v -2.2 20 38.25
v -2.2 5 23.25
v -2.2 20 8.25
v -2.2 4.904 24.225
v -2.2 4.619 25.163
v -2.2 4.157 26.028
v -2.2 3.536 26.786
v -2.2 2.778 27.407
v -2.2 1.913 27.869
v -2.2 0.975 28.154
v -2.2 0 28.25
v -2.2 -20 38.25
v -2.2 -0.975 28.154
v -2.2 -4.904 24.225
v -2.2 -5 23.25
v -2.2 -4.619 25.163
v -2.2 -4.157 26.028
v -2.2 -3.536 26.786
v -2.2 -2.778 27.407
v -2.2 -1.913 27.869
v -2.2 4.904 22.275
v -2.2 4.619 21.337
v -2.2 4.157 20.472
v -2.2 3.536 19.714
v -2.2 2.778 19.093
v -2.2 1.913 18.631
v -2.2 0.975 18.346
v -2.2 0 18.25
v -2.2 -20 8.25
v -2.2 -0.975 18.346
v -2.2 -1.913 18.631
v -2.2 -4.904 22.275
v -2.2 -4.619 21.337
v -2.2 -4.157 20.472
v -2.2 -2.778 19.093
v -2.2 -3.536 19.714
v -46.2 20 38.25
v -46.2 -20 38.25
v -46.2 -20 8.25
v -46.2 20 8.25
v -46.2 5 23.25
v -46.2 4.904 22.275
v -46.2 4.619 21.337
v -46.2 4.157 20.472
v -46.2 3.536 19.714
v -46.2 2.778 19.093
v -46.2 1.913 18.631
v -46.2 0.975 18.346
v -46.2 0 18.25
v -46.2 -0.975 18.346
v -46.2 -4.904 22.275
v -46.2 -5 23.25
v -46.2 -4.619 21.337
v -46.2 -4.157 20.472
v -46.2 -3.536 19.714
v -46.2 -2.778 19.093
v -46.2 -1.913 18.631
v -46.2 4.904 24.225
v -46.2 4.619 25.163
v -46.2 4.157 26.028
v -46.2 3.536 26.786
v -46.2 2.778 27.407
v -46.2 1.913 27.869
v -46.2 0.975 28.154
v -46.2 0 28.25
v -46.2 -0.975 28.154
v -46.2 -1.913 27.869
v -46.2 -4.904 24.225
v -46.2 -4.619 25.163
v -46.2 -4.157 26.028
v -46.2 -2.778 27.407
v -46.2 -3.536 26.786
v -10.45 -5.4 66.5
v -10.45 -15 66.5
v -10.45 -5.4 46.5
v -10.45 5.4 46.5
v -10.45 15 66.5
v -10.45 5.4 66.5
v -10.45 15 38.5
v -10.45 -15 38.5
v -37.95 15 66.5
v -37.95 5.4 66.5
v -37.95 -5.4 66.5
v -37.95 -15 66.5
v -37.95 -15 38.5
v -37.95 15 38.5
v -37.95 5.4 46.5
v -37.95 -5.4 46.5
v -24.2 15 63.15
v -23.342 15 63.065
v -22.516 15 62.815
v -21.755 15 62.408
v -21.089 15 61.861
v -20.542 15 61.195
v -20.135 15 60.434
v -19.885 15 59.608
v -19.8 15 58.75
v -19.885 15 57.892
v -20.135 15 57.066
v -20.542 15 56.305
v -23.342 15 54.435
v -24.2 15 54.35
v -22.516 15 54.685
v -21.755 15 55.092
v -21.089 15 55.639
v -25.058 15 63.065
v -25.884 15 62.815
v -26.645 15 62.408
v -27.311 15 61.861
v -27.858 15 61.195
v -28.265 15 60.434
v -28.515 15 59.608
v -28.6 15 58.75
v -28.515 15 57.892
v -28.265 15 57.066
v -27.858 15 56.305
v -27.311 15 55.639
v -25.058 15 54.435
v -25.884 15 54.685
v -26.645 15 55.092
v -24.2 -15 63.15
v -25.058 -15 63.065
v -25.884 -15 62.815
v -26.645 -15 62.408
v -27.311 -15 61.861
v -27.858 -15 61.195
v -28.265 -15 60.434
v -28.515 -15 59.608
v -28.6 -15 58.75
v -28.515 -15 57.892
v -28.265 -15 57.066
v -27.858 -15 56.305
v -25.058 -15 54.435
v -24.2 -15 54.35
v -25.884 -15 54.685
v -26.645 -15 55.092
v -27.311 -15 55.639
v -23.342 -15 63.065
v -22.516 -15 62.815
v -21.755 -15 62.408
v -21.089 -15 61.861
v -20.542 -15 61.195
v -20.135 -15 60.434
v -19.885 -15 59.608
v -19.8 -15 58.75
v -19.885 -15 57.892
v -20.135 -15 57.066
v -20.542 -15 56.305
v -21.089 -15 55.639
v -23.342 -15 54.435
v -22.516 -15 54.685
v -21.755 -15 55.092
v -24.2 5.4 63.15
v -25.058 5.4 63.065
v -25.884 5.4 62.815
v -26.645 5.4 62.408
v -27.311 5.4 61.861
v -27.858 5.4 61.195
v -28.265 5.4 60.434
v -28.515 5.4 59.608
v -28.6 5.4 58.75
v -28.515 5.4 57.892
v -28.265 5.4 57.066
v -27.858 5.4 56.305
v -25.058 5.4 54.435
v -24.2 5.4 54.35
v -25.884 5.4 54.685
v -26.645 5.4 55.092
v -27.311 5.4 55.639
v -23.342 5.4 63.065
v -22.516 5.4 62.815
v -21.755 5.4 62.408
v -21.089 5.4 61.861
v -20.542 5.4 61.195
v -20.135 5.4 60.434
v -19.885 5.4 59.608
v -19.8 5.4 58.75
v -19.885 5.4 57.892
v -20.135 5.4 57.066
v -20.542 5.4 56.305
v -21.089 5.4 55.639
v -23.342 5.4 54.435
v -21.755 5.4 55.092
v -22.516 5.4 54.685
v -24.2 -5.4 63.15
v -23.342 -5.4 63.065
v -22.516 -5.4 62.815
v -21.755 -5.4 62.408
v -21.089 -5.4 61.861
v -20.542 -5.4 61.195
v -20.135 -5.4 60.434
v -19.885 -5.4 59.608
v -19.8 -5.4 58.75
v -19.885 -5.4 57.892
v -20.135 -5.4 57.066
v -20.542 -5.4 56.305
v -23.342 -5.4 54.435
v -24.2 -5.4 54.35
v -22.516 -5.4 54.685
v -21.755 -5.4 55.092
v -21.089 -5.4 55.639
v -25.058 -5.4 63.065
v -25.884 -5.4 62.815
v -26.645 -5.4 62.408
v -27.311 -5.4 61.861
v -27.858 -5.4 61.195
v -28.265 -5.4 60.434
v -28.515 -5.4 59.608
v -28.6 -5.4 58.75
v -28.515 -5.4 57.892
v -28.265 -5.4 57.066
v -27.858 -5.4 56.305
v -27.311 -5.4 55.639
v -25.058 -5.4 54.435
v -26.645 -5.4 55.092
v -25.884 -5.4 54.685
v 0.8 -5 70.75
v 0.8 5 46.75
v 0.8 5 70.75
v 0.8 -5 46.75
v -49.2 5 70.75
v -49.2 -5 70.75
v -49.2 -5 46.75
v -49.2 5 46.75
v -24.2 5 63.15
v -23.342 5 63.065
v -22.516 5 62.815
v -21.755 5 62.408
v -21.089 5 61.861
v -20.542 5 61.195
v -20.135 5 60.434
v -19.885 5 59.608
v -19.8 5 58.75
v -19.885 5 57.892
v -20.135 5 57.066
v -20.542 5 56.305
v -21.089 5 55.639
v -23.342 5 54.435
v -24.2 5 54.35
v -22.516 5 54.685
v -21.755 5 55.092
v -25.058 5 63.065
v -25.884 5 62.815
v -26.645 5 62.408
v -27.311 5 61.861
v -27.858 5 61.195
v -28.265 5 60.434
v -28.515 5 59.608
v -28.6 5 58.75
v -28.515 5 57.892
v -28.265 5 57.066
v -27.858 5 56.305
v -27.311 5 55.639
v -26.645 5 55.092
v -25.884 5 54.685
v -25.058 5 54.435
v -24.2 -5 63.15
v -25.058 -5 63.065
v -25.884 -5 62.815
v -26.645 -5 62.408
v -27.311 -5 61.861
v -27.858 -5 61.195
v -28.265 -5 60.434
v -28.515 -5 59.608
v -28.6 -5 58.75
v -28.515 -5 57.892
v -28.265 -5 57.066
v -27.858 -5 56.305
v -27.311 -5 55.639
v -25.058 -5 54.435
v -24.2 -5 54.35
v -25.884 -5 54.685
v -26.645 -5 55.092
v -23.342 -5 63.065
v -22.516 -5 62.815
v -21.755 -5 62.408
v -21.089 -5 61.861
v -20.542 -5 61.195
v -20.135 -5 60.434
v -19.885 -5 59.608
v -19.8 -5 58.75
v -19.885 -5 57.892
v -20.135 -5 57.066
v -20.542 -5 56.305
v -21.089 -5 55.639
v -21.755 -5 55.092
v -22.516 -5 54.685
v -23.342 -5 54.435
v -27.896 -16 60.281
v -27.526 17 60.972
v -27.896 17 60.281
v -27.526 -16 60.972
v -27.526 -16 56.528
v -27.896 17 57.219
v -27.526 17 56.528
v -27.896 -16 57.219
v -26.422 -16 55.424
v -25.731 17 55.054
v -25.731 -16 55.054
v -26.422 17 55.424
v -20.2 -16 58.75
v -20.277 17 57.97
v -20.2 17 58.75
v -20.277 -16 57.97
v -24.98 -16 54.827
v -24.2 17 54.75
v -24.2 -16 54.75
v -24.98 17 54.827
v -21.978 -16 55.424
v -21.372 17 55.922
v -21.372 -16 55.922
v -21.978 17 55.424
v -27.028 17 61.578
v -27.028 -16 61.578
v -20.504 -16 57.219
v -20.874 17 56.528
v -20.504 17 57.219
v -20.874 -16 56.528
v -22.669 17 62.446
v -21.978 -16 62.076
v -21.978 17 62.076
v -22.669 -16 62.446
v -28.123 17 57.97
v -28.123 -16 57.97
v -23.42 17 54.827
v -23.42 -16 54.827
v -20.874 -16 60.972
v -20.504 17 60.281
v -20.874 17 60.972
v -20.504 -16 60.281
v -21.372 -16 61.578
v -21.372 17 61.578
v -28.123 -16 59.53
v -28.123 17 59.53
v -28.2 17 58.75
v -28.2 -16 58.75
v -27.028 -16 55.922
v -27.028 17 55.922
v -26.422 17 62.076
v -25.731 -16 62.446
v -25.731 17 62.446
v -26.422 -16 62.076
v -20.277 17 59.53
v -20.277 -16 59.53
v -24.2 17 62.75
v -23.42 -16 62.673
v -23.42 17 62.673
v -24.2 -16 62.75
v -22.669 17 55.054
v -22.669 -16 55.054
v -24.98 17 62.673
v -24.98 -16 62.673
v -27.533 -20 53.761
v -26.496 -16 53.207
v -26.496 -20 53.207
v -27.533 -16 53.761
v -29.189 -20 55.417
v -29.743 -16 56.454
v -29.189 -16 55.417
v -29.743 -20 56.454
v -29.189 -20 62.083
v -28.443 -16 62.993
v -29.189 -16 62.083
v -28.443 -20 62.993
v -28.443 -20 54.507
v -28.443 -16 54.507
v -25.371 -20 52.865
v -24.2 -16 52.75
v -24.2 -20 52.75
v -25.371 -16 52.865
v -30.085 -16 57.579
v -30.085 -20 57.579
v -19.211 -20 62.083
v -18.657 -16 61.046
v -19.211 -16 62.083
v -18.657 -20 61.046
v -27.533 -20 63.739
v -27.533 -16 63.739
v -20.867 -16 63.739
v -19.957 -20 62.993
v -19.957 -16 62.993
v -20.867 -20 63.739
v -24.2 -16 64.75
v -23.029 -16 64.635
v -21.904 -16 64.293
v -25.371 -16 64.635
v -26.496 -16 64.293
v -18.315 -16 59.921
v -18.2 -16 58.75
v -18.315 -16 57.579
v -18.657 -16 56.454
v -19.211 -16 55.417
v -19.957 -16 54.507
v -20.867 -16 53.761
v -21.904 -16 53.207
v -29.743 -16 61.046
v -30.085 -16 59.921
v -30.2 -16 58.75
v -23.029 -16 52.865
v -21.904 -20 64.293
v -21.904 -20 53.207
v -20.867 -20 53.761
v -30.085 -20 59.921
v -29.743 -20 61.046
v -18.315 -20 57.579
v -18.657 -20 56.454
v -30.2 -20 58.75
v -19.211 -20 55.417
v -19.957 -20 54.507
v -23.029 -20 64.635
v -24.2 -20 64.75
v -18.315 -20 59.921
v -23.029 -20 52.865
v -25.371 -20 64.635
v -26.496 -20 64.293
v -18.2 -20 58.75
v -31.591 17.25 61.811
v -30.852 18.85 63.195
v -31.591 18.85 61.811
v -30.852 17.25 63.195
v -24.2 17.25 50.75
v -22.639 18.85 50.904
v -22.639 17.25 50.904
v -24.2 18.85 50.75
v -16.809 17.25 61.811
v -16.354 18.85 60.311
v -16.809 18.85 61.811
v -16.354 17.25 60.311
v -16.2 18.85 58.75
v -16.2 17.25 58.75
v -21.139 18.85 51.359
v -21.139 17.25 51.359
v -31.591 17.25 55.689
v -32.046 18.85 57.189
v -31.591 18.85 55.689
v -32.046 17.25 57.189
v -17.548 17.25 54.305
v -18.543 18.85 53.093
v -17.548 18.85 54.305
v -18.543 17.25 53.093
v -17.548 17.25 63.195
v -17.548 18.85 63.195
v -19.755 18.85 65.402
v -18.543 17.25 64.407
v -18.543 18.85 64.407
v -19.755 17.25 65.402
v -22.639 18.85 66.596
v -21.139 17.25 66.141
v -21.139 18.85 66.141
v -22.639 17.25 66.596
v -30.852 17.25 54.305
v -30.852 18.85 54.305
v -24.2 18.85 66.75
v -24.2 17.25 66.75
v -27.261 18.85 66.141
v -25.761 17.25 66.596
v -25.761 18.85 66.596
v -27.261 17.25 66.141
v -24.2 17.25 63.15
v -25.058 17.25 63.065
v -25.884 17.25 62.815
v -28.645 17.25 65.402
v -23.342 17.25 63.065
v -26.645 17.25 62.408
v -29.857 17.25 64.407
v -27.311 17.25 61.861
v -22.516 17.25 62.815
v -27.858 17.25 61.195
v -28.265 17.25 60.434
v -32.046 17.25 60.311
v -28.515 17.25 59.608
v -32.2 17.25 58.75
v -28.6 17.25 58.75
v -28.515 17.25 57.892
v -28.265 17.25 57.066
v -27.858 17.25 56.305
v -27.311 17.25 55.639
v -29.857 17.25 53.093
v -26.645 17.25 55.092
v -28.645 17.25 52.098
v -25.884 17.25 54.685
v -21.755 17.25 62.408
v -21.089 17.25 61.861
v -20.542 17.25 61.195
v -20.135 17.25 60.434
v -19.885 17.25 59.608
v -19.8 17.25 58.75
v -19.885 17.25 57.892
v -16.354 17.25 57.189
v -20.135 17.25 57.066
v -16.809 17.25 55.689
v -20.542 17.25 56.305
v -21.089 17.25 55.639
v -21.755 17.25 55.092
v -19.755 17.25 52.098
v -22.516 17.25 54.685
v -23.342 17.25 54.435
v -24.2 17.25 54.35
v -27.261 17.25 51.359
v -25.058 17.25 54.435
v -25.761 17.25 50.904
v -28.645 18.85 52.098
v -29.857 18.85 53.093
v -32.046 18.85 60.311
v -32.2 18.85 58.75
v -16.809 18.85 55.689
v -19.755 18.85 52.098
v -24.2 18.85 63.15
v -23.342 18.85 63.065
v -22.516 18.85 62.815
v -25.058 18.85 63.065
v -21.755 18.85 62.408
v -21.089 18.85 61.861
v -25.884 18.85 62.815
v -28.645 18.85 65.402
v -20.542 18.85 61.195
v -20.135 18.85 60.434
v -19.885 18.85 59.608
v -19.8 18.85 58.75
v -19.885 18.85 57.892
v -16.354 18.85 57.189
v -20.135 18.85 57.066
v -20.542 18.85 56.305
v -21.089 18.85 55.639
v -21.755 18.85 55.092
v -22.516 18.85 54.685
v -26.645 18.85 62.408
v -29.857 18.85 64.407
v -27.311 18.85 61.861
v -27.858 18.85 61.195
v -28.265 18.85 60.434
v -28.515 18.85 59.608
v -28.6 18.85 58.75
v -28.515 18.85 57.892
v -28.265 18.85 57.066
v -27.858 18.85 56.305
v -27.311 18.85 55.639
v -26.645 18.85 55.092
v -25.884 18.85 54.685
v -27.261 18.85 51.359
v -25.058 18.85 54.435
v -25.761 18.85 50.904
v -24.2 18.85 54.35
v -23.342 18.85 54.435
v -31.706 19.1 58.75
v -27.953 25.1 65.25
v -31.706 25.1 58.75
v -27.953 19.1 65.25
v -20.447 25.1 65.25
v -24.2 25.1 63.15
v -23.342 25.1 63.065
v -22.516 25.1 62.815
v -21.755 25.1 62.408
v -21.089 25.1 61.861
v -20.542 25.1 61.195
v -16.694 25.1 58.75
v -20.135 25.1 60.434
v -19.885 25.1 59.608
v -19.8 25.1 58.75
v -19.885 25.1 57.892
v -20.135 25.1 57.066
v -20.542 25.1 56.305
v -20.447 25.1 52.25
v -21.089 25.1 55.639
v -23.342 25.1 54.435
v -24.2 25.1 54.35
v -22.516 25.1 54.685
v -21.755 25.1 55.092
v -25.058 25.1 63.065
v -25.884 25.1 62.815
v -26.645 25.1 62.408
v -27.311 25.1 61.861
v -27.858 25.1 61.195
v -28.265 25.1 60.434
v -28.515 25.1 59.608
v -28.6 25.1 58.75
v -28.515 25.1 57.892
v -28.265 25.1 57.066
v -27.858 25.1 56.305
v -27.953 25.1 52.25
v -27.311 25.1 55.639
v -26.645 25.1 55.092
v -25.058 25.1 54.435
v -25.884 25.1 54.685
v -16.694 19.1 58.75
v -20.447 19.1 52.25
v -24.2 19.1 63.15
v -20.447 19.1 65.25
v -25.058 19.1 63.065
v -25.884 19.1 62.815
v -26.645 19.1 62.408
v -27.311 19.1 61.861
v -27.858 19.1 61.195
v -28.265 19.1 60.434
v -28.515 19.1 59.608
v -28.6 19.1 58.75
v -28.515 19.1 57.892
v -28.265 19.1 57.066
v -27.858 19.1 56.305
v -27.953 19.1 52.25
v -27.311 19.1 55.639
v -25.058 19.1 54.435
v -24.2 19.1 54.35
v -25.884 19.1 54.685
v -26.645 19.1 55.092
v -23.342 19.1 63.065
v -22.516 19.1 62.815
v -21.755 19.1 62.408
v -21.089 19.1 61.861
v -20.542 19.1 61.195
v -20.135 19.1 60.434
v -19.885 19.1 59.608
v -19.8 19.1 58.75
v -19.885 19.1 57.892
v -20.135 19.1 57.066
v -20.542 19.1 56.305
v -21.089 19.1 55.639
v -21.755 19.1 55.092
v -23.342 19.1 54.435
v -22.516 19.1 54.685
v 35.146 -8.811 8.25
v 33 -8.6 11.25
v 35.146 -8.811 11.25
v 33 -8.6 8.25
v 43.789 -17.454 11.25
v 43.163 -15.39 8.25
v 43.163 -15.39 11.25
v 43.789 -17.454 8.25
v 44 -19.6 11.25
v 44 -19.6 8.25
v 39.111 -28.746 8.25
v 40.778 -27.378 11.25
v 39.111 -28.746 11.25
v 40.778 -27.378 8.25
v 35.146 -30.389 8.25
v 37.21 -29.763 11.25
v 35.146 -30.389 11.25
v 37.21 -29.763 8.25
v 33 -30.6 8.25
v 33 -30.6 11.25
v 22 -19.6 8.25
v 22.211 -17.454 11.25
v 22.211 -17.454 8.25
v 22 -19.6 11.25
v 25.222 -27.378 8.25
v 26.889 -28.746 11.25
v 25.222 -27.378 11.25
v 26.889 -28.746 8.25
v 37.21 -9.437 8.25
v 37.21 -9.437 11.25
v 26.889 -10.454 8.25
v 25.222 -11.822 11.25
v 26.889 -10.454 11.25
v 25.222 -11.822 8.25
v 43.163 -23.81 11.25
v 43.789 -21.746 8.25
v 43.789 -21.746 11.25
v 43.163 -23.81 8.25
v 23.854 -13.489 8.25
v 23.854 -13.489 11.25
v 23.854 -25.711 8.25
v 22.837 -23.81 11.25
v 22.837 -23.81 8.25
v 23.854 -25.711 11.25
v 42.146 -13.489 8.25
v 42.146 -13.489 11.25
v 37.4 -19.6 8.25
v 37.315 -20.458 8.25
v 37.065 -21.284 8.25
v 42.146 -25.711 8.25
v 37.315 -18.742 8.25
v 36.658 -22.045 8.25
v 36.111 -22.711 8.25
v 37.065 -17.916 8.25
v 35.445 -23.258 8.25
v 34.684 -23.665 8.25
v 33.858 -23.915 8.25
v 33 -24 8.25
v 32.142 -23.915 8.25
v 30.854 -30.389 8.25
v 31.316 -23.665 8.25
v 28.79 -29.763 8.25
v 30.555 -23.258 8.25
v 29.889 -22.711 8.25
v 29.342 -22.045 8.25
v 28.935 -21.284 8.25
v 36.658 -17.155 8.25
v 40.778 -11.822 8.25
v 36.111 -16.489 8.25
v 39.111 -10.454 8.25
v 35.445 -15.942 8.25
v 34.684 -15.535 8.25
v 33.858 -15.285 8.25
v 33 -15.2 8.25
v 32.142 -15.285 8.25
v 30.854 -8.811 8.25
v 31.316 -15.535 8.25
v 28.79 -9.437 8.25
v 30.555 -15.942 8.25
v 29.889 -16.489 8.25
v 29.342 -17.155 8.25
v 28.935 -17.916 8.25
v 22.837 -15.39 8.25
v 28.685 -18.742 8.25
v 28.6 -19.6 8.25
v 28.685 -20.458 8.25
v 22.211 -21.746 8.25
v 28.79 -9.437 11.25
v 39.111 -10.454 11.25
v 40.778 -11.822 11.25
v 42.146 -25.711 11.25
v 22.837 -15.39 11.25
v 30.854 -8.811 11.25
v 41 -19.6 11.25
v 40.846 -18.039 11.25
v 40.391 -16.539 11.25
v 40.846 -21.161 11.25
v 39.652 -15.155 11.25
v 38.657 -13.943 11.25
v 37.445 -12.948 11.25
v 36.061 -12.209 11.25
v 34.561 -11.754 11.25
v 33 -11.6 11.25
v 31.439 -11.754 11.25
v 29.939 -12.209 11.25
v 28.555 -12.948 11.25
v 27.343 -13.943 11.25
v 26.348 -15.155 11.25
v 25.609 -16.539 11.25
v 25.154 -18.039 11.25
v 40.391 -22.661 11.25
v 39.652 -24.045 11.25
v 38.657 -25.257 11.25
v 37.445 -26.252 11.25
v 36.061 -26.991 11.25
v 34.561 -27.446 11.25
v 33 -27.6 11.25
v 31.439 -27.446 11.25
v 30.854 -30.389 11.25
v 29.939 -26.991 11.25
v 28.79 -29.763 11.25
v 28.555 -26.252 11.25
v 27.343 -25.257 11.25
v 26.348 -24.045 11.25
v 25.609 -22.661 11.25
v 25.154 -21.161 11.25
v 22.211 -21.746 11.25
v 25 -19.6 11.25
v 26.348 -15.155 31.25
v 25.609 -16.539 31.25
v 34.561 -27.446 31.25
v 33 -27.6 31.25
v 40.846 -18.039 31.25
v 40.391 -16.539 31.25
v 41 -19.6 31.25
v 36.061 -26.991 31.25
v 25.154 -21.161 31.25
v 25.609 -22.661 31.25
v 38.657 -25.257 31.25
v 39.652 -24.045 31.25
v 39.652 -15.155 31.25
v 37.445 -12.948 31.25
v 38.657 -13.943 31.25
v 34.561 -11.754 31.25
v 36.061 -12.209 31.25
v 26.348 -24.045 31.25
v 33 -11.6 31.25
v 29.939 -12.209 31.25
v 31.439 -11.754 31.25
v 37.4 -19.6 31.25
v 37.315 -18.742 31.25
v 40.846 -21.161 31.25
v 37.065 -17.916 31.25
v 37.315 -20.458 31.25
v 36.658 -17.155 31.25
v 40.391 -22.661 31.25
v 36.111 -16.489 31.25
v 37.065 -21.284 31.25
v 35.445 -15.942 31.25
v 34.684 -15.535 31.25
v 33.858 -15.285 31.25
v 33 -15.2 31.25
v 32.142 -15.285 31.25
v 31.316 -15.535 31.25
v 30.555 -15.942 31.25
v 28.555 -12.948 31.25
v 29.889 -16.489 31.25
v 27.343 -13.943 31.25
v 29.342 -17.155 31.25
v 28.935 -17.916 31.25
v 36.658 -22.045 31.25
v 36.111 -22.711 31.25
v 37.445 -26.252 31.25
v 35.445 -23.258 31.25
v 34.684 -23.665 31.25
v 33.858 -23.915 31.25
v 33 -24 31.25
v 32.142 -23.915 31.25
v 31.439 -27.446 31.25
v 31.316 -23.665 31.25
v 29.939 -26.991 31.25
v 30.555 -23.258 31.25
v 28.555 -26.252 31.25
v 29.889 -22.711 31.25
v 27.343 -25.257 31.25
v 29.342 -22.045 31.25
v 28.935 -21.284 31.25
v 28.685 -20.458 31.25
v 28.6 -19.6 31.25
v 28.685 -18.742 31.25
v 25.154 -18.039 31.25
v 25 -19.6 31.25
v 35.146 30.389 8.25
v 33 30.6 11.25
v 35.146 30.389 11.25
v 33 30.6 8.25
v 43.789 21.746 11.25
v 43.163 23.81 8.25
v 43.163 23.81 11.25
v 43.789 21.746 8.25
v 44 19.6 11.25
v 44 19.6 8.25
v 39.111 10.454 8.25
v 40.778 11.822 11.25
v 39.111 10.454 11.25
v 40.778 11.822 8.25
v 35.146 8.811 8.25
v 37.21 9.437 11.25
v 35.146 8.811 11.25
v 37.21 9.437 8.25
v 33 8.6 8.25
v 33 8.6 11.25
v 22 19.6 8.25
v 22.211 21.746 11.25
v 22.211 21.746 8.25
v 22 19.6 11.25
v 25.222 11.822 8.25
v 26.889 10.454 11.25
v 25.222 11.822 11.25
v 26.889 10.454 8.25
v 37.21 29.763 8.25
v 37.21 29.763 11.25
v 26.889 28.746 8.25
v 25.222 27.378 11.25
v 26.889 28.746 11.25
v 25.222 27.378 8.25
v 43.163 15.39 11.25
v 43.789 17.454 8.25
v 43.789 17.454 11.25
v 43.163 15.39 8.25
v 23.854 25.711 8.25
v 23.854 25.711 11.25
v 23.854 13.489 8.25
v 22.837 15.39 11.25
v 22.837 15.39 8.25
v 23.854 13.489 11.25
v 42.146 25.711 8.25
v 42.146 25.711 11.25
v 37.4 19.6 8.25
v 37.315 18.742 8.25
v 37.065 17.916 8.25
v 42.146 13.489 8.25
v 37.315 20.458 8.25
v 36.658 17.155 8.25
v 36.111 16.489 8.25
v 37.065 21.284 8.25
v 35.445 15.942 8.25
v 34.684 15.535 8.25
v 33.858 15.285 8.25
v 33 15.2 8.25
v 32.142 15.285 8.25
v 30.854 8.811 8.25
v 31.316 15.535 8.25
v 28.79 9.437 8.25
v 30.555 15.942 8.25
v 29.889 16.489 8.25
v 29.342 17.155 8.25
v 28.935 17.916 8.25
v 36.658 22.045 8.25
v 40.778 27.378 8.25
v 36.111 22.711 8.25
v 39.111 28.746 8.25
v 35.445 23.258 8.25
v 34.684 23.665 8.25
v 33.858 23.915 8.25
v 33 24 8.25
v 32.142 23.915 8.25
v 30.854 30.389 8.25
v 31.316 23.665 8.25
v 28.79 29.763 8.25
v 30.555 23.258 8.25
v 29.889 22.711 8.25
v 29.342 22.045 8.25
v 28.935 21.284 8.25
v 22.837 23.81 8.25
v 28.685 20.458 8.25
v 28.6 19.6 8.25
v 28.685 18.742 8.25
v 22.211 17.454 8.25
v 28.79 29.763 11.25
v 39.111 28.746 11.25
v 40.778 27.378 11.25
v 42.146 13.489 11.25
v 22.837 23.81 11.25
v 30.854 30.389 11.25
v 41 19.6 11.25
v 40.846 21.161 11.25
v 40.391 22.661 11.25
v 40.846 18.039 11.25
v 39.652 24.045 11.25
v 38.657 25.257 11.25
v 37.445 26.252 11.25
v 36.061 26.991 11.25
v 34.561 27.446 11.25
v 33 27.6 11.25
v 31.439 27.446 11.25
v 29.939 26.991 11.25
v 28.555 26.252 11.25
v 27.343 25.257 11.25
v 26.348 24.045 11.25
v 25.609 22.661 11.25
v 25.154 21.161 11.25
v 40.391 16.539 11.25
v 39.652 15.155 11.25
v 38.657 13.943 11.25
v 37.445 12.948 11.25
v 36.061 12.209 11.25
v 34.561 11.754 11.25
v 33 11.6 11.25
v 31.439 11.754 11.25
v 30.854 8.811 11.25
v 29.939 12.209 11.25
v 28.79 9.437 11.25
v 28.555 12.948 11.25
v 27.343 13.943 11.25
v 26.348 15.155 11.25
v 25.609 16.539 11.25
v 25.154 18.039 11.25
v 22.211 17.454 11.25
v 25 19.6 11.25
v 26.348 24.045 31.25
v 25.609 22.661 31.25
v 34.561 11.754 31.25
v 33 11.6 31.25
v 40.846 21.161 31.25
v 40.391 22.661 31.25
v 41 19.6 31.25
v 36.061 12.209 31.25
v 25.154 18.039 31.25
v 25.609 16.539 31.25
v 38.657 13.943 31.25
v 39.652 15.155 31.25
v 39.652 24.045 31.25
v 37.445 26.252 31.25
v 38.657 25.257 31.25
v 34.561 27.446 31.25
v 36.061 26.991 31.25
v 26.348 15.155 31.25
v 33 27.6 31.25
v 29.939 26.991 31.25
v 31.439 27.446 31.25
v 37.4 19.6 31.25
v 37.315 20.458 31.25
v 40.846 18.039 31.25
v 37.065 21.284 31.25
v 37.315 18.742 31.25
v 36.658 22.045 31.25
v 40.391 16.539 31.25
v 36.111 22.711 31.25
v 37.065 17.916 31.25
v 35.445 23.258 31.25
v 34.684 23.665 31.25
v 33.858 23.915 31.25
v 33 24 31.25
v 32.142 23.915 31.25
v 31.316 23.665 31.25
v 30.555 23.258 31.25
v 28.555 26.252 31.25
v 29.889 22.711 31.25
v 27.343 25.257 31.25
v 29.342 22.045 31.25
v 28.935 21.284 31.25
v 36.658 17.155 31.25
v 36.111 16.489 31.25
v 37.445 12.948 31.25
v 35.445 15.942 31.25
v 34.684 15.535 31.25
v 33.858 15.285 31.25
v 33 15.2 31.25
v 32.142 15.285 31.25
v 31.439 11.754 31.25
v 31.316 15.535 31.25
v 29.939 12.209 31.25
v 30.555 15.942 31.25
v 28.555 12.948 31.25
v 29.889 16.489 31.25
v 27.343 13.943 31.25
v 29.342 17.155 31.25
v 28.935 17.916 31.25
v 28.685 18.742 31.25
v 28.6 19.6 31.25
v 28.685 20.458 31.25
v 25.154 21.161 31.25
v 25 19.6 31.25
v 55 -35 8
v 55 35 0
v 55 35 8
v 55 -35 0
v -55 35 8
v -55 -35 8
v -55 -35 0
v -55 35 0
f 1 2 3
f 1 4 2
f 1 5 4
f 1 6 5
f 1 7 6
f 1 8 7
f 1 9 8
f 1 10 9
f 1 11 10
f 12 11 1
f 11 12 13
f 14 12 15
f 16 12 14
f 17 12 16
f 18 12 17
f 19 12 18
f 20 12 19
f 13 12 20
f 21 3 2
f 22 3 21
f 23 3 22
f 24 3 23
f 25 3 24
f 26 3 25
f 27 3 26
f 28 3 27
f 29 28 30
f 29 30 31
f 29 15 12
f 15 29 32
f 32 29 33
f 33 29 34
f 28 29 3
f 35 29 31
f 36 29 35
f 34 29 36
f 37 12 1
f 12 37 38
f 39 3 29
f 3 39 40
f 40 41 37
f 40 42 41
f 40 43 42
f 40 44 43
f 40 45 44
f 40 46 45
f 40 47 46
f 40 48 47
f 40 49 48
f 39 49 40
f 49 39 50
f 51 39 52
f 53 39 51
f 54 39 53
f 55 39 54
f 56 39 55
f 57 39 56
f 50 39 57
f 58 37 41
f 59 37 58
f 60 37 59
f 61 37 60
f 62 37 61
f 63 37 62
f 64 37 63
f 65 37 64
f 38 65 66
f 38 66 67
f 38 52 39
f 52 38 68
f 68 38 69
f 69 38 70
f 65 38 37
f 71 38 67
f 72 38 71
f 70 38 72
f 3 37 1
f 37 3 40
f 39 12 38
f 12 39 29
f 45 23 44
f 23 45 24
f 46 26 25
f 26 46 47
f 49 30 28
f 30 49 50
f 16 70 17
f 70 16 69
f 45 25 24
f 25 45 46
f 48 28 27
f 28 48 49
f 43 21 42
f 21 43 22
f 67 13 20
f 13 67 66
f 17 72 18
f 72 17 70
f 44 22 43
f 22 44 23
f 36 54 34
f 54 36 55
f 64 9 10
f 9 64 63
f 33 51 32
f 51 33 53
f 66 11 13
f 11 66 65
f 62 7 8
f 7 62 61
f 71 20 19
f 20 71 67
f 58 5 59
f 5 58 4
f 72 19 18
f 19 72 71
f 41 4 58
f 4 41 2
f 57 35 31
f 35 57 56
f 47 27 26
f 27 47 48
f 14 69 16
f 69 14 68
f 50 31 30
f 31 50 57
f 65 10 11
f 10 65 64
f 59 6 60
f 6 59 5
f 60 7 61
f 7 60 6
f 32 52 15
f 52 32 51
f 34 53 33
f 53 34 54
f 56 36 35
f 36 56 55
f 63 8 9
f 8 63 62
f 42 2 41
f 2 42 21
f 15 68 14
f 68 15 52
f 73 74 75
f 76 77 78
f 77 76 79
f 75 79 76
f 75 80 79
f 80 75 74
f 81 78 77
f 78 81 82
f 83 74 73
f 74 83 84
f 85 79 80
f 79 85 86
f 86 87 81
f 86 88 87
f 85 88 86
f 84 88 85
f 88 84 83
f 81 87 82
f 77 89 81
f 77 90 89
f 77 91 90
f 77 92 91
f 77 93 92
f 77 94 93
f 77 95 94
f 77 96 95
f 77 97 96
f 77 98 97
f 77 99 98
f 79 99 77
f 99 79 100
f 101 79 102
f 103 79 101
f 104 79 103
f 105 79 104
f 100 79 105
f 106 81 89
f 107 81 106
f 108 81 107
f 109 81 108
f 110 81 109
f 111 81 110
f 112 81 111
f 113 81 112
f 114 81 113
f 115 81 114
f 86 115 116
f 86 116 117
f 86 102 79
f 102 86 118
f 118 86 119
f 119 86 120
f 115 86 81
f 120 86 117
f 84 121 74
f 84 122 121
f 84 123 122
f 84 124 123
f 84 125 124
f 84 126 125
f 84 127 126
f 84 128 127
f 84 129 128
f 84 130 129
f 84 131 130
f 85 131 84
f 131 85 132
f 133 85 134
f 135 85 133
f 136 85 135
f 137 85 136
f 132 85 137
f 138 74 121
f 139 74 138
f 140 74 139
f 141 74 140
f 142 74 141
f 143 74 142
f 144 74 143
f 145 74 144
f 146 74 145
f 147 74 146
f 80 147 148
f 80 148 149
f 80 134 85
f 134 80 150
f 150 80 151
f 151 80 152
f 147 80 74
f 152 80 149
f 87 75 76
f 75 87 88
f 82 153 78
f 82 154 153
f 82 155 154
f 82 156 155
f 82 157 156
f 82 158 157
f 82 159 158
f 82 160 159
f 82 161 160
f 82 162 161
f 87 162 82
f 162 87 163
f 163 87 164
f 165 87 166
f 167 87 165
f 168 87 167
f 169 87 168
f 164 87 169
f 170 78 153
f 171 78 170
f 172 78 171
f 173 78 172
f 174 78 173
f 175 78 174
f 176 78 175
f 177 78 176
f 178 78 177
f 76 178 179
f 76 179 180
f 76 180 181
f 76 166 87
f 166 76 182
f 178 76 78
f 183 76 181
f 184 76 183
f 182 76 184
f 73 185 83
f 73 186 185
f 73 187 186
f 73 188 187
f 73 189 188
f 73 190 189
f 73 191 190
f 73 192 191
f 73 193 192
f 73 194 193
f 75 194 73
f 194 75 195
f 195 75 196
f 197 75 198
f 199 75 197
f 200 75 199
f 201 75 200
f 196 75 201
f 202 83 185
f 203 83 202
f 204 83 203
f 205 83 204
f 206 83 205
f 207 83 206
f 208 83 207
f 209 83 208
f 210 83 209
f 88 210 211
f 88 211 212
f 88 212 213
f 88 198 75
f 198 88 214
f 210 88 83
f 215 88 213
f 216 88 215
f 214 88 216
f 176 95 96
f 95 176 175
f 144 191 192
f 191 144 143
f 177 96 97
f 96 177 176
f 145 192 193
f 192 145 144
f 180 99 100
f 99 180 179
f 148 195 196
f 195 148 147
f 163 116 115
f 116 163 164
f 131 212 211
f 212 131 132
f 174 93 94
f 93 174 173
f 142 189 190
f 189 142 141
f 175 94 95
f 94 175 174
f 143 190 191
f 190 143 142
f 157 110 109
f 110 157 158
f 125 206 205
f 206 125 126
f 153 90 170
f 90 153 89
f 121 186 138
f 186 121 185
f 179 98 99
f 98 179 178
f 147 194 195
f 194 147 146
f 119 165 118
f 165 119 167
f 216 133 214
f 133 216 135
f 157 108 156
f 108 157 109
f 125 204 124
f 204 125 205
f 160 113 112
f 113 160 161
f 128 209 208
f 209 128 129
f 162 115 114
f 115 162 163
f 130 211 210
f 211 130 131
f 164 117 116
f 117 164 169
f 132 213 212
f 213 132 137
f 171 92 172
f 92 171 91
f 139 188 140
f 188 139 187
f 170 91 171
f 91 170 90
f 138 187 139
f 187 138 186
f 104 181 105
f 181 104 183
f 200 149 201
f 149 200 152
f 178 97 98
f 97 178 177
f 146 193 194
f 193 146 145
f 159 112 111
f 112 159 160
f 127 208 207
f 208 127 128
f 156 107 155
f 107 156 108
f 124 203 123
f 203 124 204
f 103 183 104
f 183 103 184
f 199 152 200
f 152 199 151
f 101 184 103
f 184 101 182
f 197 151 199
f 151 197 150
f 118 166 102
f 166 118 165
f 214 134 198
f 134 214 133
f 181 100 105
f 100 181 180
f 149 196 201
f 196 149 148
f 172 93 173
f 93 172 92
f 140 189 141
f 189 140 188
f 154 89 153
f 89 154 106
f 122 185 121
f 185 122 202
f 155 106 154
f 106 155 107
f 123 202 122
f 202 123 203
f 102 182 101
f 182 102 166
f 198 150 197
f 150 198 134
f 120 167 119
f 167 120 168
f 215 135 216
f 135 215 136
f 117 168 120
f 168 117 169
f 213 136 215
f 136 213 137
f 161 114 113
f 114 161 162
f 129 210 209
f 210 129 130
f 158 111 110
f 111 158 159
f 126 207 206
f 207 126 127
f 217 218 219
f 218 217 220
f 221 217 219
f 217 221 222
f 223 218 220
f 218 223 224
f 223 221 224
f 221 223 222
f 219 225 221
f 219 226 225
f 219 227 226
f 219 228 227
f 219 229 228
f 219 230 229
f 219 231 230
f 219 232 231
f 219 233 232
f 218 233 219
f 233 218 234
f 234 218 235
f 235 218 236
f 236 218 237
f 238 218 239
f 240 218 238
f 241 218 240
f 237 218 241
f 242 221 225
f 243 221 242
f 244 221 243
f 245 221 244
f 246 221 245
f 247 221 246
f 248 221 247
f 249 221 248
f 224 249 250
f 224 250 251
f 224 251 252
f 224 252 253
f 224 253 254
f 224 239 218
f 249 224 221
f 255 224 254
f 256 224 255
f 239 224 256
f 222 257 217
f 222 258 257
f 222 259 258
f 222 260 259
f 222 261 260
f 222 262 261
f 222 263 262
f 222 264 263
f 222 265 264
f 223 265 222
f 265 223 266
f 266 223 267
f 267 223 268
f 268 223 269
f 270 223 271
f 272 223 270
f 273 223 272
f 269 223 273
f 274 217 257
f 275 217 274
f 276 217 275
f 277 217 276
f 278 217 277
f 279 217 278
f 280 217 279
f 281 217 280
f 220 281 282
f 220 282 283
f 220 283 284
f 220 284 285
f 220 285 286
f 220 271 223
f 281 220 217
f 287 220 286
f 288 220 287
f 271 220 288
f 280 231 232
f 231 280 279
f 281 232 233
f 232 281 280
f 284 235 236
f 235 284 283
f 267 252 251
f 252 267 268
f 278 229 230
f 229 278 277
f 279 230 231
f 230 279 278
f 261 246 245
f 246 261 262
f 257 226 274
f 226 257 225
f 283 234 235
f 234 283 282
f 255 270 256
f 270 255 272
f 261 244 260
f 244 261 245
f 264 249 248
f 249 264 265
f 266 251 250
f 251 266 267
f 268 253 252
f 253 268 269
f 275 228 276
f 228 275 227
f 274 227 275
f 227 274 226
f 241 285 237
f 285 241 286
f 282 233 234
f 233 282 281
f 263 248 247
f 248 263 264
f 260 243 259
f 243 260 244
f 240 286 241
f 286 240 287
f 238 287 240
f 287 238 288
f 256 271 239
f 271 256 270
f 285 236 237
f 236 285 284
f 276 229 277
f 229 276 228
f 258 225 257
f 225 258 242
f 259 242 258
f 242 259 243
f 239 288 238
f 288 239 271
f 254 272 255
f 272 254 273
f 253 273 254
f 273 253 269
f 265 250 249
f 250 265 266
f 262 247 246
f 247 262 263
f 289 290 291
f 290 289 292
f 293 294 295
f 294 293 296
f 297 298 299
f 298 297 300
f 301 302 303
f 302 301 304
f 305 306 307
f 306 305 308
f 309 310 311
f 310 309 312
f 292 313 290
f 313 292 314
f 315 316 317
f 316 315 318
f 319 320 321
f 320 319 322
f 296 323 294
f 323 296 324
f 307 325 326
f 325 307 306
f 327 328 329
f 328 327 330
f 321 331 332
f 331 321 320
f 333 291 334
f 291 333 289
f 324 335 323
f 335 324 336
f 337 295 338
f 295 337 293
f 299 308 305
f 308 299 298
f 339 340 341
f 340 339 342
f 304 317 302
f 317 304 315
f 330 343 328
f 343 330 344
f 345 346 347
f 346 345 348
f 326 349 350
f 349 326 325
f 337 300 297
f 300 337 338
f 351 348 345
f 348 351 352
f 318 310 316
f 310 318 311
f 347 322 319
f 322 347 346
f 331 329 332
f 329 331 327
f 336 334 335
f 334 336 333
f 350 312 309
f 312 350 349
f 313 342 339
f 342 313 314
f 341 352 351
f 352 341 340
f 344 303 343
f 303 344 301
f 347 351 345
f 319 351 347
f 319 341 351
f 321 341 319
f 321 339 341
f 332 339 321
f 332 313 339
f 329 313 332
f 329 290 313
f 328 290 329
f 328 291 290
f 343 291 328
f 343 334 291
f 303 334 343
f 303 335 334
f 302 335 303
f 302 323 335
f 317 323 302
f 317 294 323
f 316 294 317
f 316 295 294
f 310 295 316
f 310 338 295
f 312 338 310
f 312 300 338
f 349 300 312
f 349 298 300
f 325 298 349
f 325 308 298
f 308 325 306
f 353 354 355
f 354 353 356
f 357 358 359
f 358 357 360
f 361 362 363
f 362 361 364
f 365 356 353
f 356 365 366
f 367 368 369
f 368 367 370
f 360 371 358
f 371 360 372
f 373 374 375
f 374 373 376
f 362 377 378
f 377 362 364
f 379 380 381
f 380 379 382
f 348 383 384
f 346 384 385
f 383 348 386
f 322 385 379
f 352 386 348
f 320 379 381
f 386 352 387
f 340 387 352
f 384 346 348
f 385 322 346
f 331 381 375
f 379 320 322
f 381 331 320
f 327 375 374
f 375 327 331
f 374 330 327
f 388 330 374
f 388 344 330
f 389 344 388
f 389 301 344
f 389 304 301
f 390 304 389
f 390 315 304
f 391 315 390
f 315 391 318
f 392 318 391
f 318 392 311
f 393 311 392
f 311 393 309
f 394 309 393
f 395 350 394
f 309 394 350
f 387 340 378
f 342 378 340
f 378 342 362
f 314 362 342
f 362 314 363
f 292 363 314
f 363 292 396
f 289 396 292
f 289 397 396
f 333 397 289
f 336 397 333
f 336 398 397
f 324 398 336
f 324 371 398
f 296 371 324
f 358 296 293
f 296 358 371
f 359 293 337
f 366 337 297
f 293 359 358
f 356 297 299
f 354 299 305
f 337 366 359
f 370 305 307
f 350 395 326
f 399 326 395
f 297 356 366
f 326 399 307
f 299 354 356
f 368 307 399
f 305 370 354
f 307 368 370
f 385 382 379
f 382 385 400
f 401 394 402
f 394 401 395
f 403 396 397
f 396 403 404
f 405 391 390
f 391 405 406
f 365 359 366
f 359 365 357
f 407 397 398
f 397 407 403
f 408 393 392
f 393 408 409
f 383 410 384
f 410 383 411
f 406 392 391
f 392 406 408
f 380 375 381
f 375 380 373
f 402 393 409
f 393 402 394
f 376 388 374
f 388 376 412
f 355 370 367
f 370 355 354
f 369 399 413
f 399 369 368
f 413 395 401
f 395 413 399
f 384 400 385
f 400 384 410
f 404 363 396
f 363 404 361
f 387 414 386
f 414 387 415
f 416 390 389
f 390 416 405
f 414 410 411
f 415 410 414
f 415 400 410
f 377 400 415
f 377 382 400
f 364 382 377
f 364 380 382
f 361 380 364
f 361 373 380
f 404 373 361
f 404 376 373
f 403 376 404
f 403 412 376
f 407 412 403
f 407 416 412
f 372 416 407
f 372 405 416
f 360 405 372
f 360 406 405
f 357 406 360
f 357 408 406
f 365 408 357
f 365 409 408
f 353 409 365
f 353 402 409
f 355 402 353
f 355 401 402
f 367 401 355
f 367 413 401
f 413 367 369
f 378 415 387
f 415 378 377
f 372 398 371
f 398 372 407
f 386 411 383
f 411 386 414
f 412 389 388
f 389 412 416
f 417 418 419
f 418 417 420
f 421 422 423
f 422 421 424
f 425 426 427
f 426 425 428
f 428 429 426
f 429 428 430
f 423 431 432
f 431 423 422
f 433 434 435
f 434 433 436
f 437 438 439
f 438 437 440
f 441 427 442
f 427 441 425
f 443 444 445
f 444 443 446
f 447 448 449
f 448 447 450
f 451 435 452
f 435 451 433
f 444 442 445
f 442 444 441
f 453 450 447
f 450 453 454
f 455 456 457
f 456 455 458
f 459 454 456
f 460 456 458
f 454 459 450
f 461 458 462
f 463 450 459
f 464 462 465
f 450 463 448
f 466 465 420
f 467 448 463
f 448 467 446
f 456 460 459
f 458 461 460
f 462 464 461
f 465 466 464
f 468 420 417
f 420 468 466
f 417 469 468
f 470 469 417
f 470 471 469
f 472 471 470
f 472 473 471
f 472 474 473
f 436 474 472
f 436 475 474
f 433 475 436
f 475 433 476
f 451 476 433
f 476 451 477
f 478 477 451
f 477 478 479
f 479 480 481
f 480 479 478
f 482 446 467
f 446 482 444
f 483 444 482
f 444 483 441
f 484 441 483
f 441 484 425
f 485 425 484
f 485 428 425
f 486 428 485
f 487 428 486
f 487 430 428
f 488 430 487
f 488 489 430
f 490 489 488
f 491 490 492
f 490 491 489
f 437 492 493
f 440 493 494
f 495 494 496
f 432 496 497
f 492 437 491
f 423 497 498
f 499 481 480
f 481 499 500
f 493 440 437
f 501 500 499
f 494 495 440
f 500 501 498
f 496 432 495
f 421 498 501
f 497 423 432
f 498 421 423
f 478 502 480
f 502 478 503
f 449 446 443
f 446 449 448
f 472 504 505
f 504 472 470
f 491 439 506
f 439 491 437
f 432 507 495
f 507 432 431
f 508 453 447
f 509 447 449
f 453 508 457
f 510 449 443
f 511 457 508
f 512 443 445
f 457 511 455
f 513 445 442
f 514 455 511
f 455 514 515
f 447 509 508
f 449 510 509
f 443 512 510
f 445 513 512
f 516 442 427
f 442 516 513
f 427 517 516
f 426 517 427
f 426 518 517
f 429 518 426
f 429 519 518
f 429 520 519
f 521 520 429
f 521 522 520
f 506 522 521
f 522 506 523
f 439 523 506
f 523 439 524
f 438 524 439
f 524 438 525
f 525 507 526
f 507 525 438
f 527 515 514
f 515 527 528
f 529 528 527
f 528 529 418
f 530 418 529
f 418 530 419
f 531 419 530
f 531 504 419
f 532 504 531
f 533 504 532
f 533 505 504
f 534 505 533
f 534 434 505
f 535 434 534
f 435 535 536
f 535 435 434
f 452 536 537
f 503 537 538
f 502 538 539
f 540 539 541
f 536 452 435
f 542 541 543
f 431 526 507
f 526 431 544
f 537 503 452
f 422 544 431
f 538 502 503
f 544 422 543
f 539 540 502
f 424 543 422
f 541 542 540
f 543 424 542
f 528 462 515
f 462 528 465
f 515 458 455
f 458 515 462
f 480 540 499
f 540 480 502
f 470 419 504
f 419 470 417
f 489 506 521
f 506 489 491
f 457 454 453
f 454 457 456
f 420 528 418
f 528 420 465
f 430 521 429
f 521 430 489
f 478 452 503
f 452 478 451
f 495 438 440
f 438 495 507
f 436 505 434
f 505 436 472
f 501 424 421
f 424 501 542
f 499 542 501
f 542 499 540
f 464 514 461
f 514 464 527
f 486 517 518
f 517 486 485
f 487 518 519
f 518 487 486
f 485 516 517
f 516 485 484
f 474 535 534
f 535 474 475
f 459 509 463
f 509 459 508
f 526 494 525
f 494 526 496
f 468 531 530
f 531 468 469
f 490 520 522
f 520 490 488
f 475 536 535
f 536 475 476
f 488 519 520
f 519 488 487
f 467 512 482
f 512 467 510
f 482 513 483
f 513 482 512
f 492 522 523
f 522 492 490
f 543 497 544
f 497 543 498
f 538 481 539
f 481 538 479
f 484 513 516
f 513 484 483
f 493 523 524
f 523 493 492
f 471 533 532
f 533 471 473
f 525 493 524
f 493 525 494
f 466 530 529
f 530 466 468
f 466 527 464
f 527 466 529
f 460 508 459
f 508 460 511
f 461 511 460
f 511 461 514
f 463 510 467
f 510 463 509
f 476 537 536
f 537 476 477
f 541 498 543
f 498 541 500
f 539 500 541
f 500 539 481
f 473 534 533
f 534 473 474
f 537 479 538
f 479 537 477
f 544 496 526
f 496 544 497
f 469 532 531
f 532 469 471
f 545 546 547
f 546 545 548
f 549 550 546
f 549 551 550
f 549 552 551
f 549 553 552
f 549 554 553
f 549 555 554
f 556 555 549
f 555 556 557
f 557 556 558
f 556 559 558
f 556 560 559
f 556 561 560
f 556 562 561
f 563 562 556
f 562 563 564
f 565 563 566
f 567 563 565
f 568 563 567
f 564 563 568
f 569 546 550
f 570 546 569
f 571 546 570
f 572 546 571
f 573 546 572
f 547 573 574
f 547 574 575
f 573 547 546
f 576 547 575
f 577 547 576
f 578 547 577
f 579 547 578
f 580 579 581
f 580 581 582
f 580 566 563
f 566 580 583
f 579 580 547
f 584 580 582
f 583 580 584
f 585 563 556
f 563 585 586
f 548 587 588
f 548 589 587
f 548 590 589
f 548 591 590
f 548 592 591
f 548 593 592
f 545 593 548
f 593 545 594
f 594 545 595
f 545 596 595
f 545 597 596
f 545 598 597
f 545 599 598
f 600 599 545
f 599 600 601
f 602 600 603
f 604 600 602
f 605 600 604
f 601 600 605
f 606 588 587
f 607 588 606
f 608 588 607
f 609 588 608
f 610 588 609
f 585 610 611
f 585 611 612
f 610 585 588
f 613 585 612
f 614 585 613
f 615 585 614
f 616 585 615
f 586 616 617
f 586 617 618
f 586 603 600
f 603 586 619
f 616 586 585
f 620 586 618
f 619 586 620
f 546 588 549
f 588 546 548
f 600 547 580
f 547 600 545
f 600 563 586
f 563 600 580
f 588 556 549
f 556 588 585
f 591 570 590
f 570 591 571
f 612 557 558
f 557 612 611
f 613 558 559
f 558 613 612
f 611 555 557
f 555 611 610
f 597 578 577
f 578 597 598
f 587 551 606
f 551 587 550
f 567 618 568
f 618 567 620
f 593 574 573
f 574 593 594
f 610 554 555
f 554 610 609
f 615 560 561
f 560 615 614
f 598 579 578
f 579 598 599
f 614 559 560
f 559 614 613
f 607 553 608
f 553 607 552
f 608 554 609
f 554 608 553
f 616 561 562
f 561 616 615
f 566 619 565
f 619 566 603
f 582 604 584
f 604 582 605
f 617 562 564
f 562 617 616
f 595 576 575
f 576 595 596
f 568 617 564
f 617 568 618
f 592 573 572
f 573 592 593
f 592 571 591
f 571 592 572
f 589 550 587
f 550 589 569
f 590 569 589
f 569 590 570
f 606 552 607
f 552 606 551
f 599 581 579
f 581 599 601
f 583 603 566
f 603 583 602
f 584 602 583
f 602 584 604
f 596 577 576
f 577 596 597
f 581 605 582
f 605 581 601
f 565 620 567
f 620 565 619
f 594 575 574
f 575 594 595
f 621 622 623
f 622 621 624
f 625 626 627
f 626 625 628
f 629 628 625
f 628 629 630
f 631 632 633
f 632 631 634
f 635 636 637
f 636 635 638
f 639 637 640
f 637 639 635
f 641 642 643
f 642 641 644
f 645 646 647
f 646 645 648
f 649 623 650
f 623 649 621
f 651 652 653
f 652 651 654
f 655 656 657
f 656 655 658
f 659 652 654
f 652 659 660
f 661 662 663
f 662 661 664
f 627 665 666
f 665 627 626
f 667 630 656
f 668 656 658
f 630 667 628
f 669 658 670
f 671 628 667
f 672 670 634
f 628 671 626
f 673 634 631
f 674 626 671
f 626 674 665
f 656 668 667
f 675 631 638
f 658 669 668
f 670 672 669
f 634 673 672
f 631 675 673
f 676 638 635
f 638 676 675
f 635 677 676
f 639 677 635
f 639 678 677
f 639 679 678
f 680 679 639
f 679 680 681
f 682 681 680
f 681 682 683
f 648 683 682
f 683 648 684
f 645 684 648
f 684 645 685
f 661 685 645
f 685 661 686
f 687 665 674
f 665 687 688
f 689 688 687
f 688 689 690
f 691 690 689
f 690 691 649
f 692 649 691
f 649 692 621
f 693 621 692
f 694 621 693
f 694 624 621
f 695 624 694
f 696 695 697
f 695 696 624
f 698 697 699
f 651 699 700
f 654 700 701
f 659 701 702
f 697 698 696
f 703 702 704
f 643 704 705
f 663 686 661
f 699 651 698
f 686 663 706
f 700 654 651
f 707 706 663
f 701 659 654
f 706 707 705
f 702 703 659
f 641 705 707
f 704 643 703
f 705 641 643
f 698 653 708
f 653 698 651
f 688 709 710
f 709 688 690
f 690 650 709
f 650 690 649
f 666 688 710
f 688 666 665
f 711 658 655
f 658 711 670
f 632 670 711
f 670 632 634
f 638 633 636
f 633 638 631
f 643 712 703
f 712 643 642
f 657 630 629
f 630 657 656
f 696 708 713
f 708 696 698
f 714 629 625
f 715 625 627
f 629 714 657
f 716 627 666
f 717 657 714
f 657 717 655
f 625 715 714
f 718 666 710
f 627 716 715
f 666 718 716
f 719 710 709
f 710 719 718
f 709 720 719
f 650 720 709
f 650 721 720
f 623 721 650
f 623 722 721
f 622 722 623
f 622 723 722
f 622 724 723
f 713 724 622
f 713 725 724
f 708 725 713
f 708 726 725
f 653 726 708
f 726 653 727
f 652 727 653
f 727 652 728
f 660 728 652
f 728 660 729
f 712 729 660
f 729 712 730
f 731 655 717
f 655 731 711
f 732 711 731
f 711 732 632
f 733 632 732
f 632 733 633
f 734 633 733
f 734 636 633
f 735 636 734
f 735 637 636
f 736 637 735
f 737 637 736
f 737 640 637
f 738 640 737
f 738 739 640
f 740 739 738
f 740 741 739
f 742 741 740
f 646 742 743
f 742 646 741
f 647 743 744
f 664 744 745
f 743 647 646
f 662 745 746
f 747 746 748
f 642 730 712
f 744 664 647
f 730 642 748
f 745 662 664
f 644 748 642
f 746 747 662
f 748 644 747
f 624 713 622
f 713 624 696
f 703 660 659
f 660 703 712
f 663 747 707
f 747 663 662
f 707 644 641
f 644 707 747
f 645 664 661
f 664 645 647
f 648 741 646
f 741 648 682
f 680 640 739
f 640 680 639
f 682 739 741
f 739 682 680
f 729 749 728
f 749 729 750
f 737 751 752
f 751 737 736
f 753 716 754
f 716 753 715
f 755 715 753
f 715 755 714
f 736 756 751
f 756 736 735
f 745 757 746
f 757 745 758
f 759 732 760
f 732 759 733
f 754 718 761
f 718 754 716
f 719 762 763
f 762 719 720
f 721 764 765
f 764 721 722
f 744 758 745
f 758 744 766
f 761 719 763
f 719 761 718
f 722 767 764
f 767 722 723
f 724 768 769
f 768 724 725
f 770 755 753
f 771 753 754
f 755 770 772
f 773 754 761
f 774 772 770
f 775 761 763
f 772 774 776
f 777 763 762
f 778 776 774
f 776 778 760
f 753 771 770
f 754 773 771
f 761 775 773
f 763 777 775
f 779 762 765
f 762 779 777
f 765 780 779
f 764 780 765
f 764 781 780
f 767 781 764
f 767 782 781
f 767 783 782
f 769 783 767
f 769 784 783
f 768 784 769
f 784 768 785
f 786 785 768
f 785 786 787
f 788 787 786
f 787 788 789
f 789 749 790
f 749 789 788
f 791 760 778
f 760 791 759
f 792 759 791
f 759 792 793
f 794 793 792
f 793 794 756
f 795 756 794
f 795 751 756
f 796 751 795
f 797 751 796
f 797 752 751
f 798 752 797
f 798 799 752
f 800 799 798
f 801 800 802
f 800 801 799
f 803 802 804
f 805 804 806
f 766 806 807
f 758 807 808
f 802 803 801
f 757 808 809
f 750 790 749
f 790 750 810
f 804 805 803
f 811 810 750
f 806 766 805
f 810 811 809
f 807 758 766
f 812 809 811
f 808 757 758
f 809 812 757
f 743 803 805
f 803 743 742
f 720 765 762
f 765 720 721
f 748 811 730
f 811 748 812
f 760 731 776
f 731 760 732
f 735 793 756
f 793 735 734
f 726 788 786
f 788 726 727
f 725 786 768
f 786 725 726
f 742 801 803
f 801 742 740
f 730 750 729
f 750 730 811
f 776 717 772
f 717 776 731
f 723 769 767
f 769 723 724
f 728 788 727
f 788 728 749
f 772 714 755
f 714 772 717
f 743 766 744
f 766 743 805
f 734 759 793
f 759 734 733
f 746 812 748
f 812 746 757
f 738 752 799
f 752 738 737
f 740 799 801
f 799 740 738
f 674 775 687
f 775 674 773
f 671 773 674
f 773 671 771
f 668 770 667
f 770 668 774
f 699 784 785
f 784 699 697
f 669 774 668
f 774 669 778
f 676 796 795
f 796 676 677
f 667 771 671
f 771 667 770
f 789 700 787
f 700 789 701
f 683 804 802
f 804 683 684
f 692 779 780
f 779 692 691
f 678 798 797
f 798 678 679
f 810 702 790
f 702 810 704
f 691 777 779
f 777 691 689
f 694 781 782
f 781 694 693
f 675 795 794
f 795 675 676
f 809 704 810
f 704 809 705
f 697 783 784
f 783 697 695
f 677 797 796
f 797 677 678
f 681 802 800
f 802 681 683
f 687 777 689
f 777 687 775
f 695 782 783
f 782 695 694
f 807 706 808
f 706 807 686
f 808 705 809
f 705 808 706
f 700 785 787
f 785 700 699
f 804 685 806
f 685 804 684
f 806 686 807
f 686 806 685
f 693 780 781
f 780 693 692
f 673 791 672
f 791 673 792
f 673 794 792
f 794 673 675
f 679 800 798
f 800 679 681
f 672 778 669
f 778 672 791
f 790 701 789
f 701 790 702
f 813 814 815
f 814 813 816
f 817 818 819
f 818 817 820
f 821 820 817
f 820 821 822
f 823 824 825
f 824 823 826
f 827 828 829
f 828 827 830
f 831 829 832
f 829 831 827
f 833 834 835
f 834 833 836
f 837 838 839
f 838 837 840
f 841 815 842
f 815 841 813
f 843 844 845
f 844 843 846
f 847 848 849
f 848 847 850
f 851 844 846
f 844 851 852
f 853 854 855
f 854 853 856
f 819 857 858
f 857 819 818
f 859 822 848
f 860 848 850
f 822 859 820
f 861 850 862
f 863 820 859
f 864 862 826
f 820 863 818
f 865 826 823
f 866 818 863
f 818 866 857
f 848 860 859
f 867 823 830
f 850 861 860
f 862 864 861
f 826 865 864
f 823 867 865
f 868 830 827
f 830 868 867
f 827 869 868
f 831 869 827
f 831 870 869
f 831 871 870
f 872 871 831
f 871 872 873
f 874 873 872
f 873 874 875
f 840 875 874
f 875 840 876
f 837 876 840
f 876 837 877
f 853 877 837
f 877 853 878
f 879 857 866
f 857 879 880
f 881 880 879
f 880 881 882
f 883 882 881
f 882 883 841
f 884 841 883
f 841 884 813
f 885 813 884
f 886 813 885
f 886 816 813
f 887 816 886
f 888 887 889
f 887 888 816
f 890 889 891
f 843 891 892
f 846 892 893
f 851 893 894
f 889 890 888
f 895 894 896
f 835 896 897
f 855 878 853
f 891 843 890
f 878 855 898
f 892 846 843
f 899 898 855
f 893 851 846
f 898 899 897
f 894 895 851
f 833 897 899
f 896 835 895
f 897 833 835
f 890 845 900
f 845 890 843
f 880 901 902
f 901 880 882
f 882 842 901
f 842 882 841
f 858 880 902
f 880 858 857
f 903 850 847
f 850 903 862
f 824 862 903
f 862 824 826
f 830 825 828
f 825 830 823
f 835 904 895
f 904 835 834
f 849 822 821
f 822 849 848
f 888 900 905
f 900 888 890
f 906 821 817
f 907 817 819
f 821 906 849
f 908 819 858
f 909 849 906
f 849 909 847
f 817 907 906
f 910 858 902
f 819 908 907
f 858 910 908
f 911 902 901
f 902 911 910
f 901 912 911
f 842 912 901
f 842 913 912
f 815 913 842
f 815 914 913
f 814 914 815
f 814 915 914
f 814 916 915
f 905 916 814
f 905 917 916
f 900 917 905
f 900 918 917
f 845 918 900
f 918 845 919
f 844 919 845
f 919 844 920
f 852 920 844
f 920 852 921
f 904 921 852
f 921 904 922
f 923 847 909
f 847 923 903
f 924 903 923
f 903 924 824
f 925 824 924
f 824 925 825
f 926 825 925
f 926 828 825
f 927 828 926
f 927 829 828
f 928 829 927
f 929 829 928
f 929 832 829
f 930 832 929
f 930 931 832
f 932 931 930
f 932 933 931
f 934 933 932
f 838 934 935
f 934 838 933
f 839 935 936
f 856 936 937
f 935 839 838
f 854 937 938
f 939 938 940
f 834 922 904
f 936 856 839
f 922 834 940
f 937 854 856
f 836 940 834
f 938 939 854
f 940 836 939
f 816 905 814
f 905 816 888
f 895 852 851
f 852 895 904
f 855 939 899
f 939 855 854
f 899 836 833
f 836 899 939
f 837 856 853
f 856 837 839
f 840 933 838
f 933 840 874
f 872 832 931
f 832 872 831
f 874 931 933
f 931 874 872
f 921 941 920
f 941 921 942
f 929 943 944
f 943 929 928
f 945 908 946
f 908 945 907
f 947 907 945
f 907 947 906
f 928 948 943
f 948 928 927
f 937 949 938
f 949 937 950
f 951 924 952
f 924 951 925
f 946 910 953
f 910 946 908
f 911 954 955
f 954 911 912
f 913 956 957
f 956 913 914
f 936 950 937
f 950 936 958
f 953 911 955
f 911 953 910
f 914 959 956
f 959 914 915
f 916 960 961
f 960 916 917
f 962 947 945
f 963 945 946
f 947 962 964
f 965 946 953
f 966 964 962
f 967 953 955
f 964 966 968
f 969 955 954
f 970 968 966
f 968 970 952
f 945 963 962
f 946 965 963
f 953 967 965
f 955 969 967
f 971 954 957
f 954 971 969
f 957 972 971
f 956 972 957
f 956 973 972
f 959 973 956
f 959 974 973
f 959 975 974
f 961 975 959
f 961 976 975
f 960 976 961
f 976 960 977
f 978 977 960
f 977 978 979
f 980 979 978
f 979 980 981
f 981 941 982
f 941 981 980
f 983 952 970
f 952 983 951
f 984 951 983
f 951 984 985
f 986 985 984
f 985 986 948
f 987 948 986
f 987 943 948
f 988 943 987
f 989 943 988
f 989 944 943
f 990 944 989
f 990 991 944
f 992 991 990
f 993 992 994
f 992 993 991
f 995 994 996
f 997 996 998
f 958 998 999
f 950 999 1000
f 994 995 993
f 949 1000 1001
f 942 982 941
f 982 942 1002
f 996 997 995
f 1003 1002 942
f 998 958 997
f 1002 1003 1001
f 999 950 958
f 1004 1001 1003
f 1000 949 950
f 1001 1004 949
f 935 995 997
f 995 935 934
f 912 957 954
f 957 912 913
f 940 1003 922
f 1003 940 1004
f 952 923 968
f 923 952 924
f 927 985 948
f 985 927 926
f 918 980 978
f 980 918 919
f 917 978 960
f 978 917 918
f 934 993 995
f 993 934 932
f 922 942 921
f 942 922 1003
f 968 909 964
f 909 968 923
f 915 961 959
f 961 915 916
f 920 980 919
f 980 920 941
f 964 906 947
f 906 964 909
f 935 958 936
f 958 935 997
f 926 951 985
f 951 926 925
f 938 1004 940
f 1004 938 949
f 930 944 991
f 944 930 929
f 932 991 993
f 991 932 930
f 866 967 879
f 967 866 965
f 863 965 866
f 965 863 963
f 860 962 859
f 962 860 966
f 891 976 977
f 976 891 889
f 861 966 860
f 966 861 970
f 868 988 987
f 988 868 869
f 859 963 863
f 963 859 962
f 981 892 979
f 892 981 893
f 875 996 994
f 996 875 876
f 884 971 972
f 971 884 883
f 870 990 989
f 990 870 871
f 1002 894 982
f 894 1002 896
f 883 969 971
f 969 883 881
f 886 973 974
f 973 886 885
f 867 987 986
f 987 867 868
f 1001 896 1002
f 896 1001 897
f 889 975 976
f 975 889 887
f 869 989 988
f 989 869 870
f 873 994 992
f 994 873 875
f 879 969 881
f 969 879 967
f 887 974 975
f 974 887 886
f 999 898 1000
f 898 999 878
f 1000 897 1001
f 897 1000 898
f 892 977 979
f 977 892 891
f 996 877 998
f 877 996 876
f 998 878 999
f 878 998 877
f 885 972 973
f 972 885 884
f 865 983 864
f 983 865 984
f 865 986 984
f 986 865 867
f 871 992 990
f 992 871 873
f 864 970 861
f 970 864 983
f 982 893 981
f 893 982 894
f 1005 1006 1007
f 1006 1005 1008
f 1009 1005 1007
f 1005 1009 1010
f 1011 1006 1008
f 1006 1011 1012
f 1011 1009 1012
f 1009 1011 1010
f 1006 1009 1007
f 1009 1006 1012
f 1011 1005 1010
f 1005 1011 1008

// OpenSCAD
$fn = 32;

// ------------------------------------------------------------------------
// Indexing jig: plate 110 x 70 mm, pin d8
// Every part is its own module, assembly() places every instance.
// ------------------------------------------------------------------------

// --- part 1 ---
module jig_plate() {
  difference() {
    translate([-55, -35, 0]) cube([110, 70, 8]);
  }
}

// --- part 2 ---
module locator_block() {
  difference() {
    translate([-22, -20, 0]) cube([44, 40, 30]);
    translate([0, 0, 15]) rotate([0, 90, 0]) cylinder(h = 46, d = 10, center = true);
  }
}

// --- part 3 ---
module index_fork() {
  difference() {
    translate([-13.75, -15, 0]) cube([27.5, 30, 28]);
    translate([-14.75, -5.4, 8]) cube([29.5, 10.8, 21]);
    translate([0, 0, 20.25]) rotate([90, 0, 0]) cylinder(h = 32, d = 8.8, center = true);
  }
}

// --- part 4 ---
module index_arm() {
  difference() {
    translate([-25, -5, 0]) cube([50, 10, 24]);
    translate([0, 0, 12]) rotate([90, 0, 0]) cylinder(h = 12, d = 8.8, center = true);
  }
}

// --- part 5 ---
module index_pin() {
  rotate([0, 90, 0]) cylinder(h = 34, d = 8, center = true);
  translate([-20, 0, 0]) rotate([0, 90, 0]) cylinder(h = 4, d = 12);
}

// --- part 6 ---
module pin_washer() {
  difference() {
      translate([0, 0, 0]) cylinder(h = 1.6, d = 16);
      translate([0, 0, -1]) cylinder(h = 3.6, d = 8.8);
    }
}

// --- part 7 ---
module lock_nut() {
  difference() {
    linear_extrude(height = 6) polygon(points = [[7.506, 0], [3.753, 6.5], [-3.753, 6.5], [-7.506, 0], [-3.753, -6.5], [3.753, -6.5]]);
    translate([0, 0, -1]) cylinder(h = 8, d = 8.8);
  }
}

// --- part 8 ---
module guide_bush_a() {
  difference() {
    union() {
      cylinder(h = 3, d = 22);
      translate([0, 0, 3]) cylinder(h = 20, d = 16);
    }
    translate([0, 0, -1]) cylinder(h = 25, d = 8.8);
  }
}

// --- part 9 ---
module guide_bush_b() {
  difference() {
    union() {
      cylinder(h = 3, d = 22);
      translate([0, 0, 3]) cylinder(h = 20, d = 16);
    }
    translate([0, 0, -1]) cylinder(h = 25, d = 8.8);
  }
}

// --- assembly ---
module assembly() {
  color([0.80, 0.24, 0.20]) translate([0, 0, 0]) rotate([0, 0, 0]) jig_plate();
  color([0.20, 0.45, 0.75]) translate([-24.2, 0, 8.25]) rotate([0, 0, 0]) locator_block();
  color([0.25, 0.62, 0.32]) translate([-24.2, 0, 38.5]) rotate([0, 0, 0]) index_fork();
  color([0.92, 0.70, 0.18]) translate([-24.2, 0, 46.75]) rotate([0, 0, 0]) index_arm();
  color([0.58, 0.35, 0.70]) translate([-24.2, 0, 58.75]) rotate([0, 0, 90]) index_pin();
  color([0.16, 0.66, 0.66]) translate([-24.2, 18.85, 58.75]) rotate([90, 0, 0]) pin_washer();
  color([0.85, 0.48, 0.18]) translate([-24.2, 25.1, 58.75]) rotate([90, 0, 0]) lock_nut();
  color([0.55, 0.60, 0.65]) translate([33, -19.6, 8.25]) rotate([0, 0, 0]) guide_bush_a();
  color([0.75, 0.30, 0.55]) translate([33, 19.6, 8.25]) rotate([0, 0, 0]) guide_bush_b();
}

assembly();
